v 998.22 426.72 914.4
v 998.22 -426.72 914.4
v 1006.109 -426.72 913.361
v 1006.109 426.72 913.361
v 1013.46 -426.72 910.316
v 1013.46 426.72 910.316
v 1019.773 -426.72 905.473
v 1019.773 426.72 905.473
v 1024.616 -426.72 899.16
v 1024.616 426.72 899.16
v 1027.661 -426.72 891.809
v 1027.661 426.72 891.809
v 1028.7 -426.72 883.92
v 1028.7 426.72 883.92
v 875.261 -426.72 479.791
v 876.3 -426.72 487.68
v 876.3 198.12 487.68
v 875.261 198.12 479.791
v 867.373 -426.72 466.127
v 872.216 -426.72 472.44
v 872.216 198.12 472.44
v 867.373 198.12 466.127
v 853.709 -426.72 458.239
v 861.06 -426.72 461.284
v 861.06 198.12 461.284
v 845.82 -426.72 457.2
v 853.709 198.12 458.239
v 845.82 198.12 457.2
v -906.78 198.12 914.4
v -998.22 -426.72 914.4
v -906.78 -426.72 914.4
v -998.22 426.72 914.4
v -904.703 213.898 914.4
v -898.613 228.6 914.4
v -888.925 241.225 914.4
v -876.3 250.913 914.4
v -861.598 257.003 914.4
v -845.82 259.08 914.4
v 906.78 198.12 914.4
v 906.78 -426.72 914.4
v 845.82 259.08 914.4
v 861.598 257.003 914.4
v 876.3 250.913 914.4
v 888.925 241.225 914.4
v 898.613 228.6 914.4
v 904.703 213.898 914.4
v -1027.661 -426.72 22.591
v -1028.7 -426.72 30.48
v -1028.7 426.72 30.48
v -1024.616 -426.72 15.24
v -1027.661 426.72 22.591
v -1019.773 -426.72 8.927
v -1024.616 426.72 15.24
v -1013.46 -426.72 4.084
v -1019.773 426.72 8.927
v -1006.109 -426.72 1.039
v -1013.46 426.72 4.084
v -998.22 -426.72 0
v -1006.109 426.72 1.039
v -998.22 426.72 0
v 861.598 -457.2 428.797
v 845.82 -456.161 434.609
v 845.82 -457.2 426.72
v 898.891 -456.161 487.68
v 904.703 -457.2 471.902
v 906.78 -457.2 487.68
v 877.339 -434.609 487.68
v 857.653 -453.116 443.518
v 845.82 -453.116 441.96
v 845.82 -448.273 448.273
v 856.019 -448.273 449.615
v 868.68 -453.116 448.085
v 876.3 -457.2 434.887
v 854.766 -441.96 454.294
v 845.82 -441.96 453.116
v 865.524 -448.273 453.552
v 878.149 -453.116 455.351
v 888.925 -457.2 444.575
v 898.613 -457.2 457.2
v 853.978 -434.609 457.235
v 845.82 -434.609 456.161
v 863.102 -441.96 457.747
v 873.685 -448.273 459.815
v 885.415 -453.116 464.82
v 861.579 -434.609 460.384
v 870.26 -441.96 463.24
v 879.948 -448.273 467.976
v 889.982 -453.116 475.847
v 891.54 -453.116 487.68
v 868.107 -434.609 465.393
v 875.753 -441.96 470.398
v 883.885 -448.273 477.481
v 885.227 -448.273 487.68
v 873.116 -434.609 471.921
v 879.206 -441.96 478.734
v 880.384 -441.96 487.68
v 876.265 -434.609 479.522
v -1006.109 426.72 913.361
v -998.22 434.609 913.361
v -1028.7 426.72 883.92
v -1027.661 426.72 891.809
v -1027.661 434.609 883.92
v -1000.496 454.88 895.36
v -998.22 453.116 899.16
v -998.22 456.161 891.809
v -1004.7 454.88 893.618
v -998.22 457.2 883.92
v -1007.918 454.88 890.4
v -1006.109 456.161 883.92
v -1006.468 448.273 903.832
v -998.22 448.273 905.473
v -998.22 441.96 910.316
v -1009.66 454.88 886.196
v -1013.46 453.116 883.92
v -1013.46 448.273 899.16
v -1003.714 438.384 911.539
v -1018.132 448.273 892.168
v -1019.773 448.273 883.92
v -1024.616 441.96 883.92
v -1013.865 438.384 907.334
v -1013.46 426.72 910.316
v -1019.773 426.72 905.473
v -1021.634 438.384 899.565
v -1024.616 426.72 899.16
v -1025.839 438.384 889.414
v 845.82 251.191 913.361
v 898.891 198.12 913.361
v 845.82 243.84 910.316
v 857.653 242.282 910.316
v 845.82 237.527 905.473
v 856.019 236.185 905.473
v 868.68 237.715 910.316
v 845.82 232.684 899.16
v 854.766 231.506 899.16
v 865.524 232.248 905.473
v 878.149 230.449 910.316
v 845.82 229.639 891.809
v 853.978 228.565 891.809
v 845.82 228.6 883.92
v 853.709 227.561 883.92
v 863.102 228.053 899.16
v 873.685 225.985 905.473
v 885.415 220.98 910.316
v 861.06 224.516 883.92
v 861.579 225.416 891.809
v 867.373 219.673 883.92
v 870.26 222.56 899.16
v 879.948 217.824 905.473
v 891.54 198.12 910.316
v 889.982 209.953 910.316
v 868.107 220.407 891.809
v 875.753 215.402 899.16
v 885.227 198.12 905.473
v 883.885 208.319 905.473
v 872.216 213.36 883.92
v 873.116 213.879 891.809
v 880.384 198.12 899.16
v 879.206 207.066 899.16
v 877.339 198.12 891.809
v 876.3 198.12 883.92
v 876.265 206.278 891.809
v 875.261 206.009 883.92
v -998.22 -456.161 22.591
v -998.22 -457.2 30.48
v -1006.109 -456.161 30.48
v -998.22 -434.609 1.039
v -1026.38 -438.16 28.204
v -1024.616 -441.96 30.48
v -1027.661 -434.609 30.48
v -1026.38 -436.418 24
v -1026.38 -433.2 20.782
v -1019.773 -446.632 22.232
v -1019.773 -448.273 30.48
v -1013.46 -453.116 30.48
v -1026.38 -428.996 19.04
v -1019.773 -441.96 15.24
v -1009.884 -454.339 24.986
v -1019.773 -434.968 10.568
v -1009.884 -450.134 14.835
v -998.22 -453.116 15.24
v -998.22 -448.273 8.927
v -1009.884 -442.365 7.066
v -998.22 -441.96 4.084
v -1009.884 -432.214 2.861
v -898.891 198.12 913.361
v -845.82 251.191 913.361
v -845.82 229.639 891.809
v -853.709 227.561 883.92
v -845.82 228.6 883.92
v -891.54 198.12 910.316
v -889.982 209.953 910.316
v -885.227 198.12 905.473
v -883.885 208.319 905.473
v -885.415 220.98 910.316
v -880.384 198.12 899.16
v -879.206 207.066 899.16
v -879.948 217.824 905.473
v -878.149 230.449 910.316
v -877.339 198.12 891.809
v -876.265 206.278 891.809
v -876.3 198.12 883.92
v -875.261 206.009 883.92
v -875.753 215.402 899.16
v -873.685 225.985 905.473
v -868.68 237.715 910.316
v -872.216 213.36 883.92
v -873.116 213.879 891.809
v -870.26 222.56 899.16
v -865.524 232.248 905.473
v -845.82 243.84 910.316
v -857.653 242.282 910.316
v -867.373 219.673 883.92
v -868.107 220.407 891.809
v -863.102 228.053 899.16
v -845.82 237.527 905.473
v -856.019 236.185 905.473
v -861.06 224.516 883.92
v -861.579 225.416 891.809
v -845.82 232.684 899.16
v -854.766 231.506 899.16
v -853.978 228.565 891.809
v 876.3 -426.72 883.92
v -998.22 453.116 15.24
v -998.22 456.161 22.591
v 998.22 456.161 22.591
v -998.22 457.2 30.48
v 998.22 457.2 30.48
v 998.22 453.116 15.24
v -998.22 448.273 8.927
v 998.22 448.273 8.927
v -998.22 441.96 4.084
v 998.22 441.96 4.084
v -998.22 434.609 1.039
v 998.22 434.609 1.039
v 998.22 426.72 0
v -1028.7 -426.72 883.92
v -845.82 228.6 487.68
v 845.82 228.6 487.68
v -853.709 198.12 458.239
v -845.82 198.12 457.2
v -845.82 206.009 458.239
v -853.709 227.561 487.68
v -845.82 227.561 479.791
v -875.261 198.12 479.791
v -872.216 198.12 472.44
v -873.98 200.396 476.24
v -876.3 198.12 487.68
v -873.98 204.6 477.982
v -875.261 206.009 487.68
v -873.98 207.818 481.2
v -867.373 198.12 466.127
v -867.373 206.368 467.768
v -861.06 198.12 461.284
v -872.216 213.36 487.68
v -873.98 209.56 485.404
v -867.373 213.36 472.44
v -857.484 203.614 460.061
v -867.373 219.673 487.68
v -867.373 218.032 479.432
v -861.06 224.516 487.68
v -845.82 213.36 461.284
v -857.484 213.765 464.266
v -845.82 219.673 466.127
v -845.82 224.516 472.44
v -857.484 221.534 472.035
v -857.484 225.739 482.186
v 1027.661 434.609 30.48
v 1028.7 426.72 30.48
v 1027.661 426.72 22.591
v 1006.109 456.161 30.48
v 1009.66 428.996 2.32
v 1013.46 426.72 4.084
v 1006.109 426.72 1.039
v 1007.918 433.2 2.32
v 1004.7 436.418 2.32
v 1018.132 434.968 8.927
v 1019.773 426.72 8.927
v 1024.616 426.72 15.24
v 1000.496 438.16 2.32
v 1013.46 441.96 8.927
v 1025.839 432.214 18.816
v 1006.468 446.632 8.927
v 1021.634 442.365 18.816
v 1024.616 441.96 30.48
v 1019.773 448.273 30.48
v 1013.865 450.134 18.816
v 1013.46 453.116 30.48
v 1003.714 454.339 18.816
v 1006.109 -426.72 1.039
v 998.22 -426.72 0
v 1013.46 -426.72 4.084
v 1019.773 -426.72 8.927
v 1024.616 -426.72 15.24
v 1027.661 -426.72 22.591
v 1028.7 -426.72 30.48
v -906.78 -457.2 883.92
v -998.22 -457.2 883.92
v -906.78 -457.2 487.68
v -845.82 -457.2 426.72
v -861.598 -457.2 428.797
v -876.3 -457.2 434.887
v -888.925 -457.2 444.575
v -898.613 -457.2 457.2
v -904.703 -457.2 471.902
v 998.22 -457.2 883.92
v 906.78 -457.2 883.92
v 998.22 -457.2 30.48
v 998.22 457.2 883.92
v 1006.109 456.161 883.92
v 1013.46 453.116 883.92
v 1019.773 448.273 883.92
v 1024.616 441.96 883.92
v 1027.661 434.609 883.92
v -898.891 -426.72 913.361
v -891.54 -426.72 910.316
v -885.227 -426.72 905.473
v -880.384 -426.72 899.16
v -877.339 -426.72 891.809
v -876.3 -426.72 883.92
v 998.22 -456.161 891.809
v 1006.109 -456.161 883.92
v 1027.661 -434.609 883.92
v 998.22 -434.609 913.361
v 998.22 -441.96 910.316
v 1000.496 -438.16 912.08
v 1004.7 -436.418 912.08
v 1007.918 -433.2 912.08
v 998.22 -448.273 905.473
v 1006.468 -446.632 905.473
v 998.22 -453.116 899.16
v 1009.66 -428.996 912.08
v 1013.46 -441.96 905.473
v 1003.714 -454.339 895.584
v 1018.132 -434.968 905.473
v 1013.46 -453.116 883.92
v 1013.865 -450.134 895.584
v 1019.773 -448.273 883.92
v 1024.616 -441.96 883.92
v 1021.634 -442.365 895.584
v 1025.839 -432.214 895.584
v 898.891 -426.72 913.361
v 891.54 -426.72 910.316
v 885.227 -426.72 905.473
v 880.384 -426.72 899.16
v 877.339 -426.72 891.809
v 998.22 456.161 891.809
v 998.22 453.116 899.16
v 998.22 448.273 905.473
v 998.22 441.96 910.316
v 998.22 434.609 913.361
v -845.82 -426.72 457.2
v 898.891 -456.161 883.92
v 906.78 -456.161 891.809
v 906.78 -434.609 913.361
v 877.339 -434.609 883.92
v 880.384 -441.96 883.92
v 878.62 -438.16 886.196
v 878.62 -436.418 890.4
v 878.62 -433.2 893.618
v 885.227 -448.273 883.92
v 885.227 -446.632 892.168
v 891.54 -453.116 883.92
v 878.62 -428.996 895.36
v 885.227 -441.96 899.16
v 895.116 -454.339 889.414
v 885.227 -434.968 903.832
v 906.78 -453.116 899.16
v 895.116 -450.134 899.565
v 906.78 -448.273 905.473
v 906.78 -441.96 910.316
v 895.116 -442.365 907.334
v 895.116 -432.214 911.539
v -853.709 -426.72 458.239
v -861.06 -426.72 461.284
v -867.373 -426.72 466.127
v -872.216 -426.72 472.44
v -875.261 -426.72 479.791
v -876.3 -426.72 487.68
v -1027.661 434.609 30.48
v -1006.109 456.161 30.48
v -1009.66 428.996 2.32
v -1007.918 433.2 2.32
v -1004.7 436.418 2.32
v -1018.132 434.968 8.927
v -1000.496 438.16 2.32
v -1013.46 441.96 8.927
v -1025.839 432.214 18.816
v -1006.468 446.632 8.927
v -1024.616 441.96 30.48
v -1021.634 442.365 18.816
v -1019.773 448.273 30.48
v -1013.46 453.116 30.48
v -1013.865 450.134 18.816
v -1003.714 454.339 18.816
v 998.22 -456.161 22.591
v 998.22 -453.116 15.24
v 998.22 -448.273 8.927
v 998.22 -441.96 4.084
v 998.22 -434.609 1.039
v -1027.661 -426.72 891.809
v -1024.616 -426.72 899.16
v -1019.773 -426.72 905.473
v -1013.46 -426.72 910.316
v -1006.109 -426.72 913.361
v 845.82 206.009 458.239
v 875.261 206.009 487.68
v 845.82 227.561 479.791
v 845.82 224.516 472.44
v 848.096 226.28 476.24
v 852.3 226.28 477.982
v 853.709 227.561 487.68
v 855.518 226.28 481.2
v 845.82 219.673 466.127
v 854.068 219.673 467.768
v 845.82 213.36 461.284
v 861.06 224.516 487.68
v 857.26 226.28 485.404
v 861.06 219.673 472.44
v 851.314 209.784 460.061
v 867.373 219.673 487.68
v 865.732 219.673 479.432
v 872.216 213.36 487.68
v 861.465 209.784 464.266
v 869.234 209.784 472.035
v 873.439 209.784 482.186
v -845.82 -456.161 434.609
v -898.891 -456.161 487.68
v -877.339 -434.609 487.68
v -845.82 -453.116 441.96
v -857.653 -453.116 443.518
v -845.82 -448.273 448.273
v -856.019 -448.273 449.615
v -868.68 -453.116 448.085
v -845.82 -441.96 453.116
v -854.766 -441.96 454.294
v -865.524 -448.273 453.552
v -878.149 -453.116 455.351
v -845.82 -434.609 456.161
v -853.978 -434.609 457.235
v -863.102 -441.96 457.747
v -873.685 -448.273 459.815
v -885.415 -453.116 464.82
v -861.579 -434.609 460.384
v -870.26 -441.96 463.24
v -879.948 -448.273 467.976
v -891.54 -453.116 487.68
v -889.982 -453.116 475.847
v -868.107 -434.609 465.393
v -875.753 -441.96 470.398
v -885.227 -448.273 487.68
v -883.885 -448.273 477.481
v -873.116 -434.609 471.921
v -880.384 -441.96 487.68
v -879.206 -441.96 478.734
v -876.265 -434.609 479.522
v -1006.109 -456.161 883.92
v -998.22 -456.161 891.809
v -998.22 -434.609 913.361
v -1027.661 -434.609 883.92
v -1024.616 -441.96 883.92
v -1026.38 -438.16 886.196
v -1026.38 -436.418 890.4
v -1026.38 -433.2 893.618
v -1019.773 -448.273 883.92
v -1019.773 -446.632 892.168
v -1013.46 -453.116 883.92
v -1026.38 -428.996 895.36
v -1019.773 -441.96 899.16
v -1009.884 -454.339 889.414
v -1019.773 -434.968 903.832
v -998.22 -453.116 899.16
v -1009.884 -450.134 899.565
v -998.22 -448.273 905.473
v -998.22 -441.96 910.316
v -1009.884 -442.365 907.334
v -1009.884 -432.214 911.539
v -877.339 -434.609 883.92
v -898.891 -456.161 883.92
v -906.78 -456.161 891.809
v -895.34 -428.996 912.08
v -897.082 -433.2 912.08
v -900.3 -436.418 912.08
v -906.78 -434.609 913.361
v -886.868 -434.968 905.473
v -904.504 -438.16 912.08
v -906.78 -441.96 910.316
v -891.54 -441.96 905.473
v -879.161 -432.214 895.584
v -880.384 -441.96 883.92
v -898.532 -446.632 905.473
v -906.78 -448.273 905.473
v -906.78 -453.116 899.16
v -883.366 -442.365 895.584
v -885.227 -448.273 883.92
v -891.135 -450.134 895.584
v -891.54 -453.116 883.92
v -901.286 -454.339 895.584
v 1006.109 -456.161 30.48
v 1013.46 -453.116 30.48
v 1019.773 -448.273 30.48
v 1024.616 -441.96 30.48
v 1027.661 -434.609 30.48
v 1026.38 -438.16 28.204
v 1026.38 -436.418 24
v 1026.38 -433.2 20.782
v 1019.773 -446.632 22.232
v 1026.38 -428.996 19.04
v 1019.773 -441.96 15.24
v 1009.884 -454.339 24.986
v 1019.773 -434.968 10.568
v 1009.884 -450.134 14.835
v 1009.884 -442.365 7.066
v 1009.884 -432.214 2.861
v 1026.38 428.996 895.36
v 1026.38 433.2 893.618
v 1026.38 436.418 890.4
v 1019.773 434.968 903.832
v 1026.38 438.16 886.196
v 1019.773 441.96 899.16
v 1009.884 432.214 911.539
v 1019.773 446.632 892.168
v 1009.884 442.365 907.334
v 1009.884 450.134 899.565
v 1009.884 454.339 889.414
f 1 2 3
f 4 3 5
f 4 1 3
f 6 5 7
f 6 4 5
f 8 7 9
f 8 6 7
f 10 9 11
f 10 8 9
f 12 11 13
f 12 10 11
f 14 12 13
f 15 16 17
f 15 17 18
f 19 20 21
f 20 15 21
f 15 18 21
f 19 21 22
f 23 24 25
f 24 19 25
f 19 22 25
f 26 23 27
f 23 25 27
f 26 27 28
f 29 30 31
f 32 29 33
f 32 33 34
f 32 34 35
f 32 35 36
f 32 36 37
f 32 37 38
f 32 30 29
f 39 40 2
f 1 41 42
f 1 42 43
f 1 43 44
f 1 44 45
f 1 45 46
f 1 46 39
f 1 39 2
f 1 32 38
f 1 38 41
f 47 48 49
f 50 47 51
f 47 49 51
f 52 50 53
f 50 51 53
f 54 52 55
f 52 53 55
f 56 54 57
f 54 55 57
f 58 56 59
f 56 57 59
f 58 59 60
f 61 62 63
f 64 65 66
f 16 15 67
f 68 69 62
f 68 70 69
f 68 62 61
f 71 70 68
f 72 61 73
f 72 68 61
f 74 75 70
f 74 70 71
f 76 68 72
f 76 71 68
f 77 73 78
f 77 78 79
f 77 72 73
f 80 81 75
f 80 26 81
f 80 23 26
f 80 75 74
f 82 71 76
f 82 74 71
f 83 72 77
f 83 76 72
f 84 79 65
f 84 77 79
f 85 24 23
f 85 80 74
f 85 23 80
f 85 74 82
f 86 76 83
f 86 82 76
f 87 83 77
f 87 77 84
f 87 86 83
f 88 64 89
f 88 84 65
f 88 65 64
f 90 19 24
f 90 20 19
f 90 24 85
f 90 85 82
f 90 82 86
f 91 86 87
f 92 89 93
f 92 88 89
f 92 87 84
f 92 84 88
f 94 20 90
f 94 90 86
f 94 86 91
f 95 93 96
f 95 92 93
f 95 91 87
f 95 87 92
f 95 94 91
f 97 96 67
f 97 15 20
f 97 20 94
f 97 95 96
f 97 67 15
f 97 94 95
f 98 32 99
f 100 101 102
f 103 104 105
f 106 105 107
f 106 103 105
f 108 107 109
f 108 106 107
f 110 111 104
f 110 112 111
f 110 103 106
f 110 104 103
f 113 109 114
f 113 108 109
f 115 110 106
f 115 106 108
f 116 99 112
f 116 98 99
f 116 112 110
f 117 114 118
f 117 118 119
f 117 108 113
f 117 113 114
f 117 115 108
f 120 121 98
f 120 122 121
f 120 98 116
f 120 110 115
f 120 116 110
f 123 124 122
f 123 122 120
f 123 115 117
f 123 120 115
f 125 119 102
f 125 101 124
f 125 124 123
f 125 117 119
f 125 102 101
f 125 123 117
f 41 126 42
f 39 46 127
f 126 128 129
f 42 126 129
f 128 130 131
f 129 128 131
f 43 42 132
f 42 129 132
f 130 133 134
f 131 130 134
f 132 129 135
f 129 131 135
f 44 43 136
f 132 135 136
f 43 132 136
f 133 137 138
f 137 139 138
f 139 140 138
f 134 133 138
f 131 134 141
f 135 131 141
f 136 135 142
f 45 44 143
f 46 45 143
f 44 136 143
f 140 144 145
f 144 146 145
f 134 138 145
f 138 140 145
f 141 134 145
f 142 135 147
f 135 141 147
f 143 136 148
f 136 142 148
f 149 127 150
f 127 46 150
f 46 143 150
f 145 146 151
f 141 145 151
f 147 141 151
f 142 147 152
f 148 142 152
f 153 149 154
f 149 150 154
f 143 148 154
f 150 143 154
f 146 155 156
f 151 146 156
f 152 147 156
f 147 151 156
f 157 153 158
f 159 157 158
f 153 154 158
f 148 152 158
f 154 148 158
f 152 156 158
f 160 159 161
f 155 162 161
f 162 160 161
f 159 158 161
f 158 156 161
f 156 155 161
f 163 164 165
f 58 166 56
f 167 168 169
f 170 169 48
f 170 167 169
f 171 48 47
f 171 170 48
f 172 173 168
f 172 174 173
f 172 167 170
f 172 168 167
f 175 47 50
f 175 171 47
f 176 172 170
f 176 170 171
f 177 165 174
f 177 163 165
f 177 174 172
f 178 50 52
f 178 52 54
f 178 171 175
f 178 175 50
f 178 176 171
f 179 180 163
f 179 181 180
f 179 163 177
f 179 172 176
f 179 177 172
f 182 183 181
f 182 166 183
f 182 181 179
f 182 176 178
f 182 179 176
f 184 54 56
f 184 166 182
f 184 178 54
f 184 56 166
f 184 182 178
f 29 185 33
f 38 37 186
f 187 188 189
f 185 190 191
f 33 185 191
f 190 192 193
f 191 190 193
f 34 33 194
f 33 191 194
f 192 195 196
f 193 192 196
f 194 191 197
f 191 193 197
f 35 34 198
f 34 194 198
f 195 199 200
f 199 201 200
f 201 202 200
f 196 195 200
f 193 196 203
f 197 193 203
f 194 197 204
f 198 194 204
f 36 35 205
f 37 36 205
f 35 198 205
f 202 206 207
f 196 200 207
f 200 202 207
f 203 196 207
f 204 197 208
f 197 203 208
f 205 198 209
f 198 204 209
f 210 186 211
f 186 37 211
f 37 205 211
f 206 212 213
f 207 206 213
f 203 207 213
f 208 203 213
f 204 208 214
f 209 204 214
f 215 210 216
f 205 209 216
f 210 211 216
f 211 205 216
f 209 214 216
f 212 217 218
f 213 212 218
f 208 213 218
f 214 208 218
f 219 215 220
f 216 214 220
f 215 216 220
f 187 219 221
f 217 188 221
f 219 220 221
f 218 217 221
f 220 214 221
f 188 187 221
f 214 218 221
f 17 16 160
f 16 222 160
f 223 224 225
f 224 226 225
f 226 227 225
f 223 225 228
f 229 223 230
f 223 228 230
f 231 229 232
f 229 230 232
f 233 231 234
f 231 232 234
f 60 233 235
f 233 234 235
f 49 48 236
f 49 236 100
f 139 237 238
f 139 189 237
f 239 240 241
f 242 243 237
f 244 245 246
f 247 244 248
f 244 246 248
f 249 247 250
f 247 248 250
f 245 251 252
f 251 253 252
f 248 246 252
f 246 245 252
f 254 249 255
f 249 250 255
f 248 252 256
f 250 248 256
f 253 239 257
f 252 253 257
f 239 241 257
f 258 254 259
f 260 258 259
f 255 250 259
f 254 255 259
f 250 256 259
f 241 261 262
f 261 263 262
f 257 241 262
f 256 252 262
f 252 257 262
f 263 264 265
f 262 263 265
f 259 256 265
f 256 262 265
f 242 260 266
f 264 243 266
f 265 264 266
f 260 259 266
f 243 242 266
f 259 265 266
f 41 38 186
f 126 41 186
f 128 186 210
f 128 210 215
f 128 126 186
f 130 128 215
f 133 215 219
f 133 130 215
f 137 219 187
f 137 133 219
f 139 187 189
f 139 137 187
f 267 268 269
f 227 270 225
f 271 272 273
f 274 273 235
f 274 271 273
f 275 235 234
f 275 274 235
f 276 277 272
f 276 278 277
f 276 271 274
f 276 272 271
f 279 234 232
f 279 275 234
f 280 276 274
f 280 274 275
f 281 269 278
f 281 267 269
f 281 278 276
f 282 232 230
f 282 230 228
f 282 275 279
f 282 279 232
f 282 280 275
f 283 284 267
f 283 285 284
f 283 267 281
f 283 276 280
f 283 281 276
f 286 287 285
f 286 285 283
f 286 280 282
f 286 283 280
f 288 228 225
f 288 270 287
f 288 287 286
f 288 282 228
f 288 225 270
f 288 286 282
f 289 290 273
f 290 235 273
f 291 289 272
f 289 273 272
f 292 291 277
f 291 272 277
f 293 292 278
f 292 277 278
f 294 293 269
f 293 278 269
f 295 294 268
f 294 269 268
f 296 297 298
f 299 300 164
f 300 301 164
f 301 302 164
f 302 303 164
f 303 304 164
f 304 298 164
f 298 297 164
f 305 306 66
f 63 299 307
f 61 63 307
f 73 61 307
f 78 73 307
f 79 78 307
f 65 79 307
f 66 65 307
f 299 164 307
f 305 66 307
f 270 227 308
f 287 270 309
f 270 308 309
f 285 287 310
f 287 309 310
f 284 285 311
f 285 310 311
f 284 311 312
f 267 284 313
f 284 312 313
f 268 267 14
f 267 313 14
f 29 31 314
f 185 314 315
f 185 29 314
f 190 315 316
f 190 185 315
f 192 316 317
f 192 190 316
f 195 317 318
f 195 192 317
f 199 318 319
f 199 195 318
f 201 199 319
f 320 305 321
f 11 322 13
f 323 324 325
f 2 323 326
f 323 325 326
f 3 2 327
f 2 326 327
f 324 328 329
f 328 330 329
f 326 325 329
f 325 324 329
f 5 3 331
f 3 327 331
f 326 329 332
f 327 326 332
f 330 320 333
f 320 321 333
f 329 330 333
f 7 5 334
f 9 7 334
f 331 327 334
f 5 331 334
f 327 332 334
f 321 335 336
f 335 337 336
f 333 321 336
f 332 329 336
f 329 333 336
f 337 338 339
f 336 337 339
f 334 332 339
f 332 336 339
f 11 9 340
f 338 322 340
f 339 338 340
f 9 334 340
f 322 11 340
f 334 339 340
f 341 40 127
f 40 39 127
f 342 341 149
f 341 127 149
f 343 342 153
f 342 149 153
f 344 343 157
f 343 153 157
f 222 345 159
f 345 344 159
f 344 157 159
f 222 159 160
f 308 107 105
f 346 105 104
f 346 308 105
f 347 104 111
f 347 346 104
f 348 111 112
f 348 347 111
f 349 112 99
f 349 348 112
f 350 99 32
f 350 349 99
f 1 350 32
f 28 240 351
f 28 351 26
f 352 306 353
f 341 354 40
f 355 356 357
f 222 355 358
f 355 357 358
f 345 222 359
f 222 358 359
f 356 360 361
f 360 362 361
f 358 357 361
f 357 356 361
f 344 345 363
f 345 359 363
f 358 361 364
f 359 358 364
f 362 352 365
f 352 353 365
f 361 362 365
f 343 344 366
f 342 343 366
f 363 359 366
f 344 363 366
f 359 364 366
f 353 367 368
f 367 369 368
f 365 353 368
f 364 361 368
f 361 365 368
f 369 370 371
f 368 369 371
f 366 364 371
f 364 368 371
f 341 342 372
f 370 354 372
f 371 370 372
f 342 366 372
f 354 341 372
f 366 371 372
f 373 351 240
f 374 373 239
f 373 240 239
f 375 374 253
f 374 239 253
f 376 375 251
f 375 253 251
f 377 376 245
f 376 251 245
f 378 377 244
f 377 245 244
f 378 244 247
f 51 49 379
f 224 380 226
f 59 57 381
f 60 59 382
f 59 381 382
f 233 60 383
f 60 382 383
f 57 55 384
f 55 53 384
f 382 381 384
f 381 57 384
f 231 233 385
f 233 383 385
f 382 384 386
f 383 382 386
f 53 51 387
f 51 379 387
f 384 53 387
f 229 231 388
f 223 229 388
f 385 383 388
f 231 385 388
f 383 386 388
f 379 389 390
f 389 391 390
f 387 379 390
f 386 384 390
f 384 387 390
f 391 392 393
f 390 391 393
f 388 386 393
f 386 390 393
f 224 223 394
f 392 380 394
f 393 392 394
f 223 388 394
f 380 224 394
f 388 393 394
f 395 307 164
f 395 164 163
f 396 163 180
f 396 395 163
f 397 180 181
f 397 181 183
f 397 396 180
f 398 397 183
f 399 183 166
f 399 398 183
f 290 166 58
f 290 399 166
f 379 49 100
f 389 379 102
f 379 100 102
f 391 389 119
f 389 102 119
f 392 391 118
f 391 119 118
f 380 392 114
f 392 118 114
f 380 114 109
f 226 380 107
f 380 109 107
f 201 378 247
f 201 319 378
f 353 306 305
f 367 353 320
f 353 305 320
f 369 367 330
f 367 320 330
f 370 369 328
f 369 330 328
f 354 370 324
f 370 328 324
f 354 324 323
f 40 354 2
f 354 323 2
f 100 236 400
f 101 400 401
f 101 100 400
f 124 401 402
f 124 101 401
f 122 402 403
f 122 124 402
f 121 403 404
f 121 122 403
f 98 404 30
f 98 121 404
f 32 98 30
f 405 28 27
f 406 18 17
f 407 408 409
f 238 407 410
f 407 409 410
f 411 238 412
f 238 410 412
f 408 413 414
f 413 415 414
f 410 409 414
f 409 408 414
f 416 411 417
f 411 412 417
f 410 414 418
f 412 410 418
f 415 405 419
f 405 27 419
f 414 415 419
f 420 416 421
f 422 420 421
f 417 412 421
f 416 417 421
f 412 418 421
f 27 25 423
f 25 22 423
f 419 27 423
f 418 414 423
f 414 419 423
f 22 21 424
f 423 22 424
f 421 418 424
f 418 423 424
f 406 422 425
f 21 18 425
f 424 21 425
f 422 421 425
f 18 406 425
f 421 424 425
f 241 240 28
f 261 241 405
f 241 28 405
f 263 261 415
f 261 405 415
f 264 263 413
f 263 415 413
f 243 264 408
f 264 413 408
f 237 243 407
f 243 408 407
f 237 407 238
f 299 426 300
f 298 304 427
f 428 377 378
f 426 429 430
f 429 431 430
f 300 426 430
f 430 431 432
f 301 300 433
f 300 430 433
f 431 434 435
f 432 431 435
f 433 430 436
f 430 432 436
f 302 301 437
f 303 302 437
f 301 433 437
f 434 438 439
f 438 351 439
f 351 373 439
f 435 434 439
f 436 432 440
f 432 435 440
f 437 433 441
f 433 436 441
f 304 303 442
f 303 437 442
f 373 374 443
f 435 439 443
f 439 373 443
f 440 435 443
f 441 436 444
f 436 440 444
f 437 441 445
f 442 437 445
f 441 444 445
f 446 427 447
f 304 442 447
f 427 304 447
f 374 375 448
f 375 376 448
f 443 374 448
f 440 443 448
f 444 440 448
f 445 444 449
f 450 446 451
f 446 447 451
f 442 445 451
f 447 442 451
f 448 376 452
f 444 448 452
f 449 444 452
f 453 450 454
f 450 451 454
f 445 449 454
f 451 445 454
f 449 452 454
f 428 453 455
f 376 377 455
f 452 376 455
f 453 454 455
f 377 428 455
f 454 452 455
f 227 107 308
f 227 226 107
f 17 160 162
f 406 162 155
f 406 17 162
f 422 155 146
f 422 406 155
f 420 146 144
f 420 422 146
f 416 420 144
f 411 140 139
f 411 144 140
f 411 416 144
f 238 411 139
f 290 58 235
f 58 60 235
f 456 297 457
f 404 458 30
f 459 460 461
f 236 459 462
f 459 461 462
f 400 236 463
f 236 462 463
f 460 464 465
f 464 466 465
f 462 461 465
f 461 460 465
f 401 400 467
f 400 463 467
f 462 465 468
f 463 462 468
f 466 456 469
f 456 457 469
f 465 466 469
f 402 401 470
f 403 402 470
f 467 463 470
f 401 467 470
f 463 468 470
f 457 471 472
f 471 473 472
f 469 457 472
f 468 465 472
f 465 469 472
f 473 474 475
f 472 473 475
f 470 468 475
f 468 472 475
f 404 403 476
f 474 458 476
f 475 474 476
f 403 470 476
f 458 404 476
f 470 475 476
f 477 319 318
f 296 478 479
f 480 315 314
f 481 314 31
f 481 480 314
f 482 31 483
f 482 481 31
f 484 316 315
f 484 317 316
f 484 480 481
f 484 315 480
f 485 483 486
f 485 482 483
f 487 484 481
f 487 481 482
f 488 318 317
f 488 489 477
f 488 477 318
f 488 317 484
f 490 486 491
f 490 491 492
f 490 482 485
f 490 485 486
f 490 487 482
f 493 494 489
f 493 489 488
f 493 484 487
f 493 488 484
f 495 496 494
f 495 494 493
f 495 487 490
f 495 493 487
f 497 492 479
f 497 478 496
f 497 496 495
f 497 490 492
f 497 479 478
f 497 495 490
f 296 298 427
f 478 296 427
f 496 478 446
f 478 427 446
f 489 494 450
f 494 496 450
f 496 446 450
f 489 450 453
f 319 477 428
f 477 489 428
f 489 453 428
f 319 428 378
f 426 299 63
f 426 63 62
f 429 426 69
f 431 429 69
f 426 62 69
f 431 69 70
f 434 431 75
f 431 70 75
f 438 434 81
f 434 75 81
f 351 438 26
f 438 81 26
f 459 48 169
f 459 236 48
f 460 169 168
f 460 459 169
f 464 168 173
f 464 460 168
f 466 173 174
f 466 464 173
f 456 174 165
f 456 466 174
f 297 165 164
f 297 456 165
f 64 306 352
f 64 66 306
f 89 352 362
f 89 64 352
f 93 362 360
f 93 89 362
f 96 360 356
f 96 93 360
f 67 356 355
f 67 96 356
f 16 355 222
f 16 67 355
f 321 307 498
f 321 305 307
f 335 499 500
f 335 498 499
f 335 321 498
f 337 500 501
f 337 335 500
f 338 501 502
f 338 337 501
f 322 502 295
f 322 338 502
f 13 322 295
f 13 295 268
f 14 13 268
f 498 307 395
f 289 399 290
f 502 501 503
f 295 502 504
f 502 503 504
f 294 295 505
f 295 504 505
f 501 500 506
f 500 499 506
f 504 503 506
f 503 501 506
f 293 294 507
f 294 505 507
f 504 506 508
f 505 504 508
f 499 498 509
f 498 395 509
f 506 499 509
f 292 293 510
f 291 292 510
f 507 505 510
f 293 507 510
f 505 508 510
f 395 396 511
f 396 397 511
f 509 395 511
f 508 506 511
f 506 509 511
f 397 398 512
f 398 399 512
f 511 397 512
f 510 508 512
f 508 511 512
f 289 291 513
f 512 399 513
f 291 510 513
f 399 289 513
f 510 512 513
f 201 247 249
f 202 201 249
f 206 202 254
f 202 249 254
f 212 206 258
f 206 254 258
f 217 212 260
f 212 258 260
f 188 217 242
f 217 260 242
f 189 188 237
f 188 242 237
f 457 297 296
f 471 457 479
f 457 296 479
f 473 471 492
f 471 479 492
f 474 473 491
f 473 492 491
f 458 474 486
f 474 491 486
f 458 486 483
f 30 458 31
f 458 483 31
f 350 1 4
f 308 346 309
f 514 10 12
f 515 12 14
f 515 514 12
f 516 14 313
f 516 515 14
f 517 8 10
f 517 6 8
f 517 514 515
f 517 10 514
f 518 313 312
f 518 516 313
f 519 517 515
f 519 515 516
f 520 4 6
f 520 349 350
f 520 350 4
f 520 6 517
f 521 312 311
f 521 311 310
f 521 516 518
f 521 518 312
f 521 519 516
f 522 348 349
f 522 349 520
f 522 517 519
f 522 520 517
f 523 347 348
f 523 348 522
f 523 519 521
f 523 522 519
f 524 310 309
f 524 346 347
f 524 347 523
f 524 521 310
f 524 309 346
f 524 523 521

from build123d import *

# Parameters (mm, degrees)
F0_W     = 2057.4
F0_H     = 914.4
F1_DEPTH = 914.4
F2_W     = 1752.6
F2_H     = 685.8
F3_DEPTH = 457.2
F4_R     = 30.48


with BuildPart() as f1:
    # F0 (on Top) → F1 (new body)
    with BuildSketch(Plane.XY):
        Rectangle(F0_W, F0_H)
    extrude(amount=F1_DEPTH)

    # F2 (on face) → F3 (cut)
    with BuildSketch(Plane.XY.offset(914.4)):
        with Locations((0, -114.3)):
            Rectangle(F2_W, F2_H)
    extrude(amount=-F3_DEPTH, mode=Mode.SUBTRACT)

    # F4
    f4_edges = [f1.edges().sort_by_distance(p)[0] for p in [
        (876.3, -114.3, 457.2),
        (0, 228.6, 457.2),
        (-876.3, -114.3, 457.2),
        (0, -457.2, 457.2),
        (-876.3, 228.6, 685.8),
        (-876.3, -457.2, 685.8),
        (-876.3, -114.3, 914.4),
        (876.3, 228.6, 685.8),
        (0, 228.6, 914.4),
        (0, -457.2, 0),
        (1028.7, -457.2, 457.2),
        (952.5, -457.2, 914.4),
        (876.3, -457.2, 685.8),
        (-952.5, -457.2, 914.4),
        (-1028.7, -457.2, 457.2),
        (-1028.7, 0, 914.4),
        (0, 457.2, 914.4),
        (1028.7, 0, 914.4),
        (876.3, -114.3, 914.4),
        (1028.7, 457.2, 457.2),
        (1028.7, 0, 0),
        (-1028.7, 457.2, 457.2),
        (-1028.7, 0, 0),
        (0, 457.2, 0),
    ]]
    fillet(f4_edges, radius=F4_R)


solid = f1.part
